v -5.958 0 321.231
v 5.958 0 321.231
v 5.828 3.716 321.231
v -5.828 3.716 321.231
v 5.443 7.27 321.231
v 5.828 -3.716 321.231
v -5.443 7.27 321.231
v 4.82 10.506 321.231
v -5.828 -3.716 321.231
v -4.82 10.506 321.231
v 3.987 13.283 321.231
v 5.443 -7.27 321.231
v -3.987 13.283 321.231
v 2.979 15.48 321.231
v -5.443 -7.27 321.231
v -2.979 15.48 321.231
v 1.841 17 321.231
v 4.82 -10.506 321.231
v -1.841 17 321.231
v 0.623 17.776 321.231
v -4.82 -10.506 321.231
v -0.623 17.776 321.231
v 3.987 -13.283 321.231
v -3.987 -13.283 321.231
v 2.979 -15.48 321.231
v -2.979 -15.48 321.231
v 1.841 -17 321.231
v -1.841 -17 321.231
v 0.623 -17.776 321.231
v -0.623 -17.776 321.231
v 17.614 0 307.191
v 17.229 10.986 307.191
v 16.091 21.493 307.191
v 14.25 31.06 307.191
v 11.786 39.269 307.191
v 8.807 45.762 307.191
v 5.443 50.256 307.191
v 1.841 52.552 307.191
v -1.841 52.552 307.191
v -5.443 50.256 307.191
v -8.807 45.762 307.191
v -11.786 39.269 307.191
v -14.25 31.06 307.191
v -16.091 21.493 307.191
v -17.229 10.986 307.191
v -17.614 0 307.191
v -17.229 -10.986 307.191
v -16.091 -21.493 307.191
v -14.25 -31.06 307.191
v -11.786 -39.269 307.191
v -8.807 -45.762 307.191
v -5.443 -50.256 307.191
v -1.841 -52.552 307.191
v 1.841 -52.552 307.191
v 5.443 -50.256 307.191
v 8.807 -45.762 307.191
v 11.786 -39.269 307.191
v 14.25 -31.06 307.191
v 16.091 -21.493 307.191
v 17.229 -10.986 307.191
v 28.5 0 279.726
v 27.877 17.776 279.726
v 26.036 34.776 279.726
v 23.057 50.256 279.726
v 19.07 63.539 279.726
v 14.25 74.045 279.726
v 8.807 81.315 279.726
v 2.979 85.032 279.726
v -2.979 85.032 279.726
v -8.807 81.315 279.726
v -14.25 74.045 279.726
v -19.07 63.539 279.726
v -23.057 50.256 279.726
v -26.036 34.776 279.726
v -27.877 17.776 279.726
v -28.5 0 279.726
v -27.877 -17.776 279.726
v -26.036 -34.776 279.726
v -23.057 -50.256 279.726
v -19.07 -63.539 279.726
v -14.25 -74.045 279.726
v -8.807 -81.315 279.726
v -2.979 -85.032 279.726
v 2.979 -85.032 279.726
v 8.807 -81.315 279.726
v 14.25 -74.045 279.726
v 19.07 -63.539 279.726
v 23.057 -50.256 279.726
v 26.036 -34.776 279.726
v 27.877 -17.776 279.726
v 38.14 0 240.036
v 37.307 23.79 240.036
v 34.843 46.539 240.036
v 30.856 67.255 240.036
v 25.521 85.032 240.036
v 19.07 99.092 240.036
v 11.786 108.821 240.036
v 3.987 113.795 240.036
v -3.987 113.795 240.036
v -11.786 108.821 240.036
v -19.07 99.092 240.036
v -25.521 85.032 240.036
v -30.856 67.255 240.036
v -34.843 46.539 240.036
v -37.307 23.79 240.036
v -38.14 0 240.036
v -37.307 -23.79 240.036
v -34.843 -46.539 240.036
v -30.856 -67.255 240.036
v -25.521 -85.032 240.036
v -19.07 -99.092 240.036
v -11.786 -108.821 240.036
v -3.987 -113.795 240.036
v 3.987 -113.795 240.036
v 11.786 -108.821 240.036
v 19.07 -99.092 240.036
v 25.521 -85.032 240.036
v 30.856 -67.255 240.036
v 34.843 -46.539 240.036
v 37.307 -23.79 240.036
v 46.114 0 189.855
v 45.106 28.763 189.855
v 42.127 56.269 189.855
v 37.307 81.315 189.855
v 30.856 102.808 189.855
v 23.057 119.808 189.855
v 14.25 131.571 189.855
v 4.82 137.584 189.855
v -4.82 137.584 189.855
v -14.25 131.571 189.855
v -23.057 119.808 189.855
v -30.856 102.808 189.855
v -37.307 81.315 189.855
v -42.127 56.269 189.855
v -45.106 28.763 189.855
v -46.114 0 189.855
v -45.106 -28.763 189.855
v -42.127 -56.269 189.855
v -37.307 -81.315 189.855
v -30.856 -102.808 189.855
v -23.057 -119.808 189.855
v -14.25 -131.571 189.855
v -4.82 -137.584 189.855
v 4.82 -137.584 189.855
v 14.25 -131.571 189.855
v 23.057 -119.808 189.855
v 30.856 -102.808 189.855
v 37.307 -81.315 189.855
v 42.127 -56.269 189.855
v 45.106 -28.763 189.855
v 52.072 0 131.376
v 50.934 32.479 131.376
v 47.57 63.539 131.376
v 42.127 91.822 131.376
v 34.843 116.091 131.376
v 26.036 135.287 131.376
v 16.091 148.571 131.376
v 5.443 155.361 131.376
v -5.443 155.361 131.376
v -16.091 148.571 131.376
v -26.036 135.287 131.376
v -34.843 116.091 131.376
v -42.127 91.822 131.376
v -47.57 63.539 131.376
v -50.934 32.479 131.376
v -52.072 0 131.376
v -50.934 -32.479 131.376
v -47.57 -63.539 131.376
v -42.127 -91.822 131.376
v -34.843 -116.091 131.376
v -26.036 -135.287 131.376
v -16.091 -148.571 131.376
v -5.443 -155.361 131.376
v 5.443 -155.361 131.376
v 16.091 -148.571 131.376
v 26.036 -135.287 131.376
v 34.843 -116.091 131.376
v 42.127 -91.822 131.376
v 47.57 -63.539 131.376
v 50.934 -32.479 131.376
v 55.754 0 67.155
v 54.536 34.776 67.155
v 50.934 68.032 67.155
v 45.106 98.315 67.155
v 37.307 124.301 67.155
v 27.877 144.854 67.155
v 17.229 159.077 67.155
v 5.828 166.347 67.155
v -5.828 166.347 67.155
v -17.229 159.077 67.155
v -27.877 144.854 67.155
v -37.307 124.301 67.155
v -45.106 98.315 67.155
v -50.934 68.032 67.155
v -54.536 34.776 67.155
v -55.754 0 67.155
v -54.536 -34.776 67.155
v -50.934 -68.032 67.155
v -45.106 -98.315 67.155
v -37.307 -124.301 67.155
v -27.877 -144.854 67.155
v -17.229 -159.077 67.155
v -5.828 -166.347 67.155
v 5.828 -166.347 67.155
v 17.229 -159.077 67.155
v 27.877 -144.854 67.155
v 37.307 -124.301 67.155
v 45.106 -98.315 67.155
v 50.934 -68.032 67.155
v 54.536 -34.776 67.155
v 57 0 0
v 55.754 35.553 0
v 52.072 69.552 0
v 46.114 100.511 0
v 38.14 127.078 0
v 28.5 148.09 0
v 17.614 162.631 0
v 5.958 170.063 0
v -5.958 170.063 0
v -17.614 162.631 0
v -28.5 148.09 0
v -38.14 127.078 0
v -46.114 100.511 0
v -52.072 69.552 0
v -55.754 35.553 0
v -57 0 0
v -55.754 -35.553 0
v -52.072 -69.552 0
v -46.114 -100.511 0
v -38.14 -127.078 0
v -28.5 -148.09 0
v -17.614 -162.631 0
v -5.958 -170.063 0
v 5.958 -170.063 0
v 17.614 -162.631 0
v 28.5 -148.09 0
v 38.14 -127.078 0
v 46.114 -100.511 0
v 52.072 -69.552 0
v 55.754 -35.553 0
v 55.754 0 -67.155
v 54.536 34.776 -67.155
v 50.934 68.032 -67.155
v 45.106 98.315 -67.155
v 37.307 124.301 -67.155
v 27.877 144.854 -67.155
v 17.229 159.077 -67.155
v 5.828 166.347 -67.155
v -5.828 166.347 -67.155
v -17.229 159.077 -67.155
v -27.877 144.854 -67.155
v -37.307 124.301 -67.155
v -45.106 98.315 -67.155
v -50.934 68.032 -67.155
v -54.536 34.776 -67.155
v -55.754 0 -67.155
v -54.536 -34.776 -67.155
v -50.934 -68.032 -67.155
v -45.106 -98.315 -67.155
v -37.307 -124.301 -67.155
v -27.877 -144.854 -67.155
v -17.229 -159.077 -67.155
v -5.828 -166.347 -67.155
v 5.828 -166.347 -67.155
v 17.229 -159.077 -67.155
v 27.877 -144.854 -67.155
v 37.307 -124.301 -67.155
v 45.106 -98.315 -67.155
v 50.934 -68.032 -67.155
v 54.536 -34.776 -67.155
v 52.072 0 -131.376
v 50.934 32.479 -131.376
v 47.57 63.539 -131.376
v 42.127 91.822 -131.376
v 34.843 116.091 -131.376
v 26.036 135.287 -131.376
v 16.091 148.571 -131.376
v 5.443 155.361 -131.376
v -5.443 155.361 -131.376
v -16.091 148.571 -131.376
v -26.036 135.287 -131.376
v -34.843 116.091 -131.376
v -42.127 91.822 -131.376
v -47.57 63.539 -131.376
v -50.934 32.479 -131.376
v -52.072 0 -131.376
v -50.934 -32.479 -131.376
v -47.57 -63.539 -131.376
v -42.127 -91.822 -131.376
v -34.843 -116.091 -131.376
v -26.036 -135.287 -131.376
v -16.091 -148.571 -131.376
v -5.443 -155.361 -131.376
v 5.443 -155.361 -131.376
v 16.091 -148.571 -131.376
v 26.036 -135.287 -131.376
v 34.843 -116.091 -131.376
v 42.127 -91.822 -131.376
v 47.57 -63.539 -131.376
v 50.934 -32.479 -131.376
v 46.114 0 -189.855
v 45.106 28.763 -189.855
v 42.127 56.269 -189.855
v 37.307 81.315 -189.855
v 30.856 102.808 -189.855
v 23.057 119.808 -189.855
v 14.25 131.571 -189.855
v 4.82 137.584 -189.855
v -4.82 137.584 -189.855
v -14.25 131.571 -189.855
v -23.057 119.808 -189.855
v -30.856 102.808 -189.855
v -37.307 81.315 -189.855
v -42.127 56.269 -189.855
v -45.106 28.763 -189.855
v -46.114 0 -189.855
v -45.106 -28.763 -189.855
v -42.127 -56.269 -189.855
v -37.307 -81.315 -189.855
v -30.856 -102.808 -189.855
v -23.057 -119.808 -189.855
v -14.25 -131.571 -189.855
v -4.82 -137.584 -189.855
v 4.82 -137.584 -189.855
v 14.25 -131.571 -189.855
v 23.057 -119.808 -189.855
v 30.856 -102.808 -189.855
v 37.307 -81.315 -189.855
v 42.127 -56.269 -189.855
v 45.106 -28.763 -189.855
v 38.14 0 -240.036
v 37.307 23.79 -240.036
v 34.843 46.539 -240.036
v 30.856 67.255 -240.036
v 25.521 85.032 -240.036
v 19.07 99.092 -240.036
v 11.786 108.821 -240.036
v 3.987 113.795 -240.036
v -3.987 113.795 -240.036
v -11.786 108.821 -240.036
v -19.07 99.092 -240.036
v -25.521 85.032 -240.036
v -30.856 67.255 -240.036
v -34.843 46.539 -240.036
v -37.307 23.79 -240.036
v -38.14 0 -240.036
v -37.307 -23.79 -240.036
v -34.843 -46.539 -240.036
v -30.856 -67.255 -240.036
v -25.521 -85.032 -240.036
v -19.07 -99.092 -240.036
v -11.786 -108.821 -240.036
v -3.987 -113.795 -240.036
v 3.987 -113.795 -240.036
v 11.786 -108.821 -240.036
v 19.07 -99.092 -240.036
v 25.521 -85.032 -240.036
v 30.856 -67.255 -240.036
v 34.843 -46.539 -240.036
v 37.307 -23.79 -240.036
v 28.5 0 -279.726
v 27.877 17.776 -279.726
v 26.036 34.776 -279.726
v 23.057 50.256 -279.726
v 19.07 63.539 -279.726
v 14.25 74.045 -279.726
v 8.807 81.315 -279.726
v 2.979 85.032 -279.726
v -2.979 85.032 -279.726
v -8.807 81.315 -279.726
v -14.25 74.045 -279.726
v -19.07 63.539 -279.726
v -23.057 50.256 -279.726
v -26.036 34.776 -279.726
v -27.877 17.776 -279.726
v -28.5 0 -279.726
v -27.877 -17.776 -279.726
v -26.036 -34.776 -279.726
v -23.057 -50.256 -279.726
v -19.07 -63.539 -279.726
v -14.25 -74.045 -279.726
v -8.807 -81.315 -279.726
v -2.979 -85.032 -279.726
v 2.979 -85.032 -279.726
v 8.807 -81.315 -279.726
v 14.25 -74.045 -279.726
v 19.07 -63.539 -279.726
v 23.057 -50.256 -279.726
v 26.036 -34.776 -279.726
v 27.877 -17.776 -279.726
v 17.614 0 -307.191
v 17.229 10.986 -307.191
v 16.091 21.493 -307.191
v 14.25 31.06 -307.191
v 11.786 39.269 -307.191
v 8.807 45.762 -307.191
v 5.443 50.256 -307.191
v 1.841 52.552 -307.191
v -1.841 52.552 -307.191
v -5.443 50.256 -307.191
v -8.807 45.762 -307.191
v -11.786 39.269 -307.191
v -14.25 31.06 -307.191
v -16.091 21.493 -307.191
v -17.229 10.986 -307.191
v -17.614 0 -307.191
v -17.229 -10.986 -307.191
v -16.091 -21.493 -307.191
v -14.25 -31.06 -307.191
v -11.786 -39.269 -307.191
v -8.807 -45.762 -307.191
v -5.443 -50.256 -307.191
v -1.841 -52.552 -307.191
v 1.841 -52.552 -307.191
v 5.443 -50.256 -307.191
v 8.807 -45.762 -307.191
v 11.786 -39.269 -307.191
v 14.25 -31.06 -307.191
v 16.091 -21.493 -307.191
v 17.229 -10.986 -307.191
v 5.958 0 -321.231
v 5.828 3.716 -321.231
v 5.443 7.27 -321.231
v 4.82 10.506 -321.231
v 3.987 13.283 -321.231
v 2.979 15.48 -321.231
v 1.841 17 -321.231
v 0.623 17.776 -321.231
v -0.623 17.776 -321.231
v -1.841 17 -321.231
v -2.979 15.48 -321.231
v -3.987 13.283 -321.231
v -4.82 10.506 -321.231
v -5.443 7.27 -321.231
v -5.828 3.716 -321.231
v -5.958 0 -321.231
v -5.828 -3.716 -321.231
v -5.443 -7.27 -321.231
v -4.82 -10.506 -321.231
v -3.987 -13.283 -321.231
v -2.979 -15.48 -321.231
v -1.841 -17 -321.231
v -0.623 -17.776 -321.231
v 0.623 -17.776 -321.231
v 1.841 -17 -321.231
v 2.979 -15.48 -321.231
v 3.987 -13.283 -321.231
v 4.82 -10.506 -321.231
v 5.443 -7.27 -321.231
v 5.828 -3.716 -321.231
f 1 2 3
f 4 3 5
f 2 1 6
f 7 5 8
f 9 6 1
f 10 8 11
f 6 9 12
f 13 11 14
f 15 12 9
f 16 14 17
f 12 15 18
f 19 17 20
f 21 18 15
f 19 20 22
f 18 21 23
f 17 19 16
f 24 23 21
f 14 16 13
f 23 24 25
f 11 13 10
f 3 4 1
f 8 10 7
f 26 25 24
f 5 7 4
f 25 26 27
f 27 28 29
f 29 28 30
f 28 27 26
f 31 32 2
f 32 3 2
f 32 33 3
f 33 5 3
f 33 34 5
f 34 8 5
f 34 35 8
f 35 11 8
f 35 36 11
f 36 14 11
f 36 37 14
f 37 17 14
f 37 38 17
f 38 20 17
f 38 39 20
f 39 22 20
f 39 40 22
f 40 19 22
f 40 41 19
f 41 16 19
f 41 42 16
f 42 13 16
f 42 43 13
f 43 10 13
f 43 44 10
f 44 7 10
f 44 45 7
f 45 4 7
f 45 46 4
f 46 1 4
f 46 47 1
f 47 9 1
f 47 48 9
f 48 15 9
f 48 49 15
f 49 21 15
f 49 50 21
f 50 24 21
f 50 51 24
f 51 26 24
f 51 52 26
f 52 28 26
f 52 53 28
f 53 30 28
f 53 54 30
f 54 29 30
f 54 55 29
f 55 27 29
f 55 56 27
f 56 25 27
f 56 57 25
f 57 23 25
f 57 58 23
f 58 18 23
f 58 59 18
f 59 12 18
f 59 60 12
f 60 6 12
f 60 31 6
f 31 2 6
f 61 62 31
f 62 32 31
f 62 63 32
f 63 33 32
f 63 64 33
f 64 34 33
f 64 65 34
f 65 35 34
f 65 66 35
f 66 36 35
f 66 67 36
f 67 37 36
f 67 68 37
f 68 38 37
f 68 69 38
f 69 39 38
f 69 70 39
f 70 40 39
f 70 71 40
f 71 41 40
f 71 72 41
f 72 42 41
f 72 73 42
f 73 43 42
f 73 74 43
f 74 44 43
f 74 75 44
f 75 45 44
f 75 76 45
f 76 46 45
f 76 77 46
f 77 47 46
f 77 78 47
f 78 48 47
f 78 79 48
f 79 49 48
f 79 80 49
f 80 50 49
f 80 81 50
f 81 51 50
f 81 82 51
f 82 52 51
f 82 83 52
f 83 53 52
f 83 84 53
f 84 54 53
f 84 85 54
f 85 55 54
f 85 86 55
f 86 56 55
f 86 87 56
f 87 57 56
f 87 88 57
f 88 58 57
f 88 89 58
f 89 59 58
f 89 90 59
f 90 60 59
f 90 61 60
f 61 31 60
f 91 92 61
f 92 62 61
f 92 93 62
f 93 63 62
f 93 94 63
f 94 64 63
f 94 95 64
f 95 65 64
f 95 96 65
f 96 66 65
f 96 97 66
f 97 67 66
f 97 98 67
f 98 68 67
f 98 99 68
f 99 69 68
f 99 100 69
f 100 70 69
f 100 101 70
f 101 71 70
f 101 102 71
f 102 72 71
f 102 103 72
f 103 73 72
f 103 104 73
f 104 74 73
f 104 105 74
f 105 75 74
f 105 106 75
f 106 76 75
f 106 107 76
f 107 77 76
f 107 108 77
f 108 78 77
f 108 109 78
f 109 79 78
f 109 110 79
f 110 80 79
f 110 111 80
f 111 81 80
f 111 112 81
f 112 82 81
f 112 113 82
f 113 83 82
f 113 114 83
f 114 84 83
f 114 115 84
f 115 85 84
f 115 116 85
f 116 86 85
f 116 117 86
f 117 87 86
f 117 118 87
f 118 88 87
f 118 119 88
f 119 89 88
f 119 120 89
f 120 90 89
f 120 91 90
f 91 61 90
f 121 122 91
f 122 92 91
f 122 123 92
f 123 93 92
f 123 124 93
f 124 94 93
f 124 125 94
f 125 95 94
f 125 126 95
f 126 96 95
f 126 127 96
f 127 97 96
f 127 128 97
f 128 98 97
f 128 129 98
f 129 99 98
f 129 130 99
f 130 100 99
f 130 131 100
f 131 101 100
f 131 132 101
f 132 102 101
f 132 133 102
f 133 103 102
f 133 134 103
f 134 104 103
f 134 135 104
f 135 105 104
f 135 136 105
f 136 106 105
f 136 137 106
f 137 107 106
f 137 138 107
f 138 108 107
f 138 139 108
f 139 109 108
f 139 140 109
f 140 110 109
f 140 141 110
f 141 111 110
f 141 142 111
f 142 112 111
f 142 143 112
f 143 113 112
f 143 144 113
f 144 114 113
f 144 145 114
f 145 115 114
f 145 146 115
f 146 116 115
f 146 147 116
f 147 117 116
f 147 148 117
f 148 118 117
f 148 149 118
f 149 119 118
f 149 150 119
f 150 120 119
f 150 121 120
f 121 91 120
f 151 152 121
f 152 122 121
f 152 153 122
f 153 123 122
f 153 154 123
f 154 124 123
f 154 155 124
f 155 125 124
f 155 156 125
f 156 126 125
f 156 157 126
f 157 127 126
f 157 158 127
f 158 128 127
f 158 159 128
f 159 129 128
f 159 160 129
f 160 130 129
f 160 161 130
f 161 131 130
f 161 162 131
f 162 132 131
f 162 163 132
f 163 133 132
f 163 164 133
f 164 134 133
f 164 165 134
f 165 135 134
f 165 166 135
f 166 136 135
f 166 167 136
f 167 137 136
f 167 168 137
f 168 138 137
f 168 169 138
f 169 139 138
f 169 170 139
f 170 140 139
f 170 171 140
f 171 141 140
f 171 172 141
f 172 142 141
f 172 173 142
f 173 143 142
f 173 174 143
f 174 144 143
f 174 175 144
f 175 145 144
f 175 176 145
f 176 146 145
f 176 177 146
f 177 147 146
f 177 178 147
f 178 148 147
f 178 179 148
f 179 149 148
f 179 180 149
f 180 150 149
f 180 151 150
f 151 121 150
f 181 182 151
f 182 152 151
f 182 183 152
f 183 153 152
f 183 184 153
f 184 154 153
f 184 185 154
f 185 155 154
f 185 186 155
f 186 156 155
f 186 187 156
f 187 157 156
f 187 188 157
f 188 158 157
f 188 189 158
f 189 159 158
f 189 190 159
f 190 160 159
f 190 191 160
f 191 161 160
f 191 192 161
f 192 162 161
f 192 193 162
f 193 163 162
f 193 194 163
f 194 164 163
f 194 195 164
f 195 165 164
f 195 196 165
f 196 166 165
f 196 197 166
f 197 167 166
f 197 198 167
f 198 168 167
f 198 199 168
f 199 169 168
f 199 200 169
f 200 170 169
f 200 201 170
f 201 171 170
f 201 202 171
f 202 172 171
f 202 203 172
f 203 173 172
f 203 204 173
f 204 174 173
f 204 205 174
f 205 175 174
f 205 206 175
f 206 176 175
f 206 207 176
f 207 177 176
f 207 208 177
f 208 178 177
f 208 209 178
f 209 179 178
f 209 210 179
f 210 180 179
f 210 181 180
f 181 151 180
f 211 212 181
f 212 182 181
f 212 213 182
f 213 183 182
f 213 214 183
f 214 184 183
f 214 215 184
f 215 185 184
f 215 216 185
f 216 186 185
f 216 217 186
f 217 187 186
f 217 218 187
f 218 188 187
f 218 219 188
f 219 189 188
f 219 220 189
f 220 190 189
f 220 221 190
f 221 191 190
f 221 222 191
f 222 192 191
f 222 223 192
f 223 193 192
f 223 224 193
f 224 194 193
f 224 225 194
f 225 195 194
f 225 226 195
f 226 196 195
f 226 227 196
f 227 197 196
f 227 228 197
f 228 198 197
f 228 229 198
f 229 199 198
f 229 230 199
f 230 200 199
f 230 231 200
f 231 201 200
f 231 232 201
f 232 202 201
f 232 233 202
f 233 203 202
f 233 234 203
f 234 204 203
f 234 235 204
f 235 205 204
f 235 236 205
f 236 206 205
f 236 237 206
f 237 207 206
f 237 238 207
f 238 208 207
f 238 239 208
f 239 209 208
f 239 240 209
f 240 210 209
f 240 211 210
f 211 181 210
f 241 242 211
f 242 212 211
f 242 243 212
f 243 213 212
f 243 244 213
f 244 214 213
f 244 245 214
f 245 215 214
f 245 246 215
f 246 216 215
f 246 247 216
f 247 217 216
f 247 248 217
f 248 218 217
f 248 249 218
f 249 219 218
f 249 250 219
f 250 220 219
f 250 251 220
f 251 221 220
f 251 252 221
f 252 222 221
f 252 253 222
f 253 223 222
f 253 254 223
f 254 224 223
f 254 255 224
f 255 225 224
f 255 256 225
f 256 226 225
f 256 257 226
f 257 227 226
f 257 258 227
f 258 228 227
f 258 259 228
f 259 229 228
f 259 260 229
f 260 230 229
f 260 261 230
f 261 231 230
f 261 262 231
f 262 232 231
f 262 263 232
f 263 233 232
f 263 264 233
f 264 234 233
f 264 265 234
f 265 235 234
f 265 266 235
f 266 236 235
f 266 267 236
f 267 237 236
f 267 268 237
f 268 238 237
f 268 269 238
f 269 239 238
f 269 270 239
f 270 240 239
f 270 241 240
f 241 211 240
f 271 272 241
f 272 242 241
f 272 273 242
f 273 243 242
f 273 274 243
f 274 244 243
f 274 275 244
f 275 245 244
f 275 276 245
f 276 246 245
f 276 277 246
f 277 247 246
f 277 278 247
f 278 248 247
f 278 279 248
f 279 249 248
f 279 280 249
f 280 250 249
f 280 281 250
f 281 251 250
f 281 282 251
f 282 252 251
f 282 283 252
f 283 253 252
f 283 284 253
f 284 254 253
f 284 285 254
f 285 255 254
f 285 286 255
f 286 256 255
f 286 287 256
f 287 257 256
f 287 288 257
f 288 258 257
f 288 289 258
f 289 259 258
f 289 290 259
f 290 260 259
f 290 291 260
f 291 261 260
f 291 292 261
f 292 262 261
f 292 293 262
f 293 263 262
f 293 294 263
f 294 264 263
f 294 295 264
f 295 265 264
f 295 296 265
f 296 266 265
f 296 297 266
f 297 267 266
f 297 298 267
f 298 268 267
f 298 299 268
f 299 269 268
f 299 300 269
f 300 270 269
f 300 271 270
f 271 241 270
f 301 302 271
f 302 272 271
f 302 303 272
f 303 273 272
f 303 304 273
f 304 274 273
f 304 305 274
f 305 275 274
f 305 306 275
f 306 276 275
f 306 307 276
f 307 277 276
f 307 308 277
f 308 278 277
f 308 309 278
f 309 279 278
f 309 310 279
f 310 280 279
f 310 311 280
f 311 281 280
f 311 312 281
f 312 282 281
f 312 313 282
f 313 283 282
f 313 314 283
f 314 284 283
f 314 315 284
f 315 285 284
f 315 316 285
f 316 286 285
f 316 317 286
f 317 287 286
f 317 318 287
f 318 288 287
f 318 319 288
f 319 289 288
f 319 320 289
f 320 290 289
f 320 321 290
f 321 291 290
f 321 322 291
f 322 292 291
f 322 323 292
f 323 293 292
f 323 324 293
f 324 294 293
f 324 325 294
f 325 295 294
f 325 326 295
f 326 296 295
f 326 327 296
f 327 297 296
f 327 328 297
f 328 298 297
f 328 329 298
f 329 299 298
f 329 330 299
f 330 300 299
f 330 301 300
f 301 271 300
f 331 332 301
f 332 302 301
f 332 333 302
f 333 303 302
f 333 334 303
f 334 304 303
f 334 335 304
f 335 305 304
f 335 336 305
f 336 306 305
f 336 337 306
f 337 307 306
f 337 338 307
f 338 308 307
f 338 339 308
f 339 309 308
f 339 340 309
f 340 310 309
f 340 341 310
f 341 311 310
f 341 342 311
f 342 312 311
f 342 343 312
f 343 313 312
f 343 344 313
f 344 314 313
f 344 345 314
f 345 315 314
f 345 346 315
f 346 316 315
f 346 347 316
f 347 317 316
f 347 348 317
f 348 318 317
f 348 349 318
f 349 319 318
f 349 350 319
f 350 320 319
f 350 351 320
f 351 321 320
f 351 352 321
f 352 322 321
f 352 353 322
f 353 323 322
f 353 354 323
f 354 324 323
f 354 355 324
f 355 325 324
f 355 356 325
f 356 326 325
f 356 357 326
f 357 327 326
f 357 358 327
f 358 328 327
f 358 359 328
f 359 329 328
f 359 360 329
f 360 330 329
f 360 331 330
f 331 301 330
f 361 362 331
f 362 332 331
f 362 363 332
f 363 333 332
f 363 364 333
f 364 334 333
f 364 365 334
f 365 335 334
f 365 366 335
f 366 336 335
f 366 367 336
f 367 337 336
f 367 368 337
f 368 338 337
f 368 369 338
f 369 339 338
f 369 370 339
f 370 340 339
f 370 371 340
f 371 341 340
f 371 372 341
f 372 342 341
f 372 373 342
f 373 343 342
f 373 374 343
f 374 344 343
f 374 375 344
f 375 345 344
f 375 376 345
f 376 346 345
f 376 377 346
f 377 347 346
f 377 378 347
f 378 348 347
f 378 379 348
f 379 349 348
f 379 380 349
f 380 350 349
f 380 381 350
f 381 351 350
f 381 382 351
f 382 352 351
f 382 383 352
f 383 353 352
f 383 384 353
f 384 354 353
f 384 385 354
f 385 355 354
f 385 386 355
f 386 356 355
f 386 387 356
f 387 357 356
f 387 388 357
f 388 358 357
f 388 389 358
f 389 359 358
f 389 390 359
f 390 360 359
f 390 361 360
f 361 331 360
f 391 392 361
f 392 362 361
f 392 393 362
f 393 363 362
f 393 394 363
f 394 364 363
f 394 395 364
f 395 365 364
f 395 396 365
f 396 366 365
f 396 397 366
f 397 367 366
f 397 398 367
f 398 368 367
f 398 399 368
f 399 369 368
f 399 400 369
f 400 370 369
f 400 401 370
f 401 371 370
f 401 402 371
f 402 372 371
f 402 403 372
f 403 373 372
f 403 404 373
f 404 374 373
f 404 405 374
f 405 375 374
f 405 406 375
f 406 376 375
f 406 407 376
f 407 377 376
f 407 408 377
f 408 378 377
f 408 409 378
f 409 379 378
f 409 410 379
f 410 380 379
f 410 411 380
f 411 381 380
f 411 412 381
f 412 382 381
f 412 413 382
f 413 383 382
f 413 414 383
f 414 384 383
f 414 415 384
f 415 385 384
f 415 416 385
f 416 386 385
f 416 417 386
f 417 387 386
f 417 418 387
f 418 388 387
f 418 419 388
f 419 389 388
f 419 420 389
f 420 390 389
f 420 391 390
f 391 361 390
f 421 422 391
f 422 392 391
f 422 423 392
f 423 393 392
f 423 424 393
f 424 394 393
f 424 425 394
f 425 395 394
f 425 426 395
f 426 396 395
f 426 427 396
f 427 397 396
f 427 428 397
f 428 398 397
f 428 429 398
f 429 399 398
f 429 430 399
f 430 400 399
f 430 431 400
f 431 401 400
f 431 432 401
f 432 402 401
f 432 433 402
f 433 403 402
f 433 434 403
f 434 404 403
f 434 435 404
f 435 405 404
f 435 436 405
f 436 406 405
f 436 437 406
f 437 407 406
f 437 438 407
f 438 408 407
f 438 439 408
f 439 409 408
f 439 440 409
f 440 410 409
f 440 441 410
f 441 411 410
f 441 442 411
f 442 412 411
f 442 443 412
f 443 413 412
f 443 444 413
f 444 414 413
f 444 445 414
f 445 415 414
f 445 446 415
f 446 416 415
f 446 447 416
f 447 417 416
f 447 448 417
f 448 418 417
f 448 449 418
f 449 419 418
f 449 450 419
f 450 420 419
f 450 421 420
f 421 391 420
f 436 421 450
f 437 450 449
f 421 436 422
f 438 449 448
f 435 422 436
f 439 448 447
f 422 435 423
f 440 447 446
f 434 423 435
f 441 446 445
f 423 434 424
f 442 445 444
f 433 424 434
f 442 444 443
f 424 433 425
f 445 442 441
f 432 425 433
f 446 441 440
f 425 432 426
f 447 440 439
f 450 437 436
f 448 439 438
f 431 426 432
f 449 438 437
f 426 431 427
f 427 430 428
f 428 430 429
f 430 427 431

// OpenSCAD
// Generated by SolidPython 1.0.1 on 2020-07-29 00:39:25


scale(v = [3, 9, 17]) {
	sphere(r = 19);
}
/***********************************************
*********      SolidPython code:      **********
************************************************
 
# import packages: SolidPython
from solid import *
from solid.utils import *
from itertools import chain, combinations


class Resize:

    def __init__(self, scad_file):
        self.scad_file = scad_file
        #self.scad_file = import_scad(scad_file)
        # cone/cylinder param:
        self.r1 = 0
        self.r2 = 0
        self.h = 0
        # rectangular prism param:
        self.w = 0
        self.l = 0
        # ellipse param:
        self.r = 0

    # import OpenScad code (file name corresponds to shape)


    # classify shape + parameters
    def assign(self, param1, param2, param3):
        if self.scad_file == 'cone.scad':
            self.r1 = param1
            self.r2 = param2
            self.h = param3
        elif self.scad_file == 'cylinder.scad':
            self.r1 = param1
            self.r2 = param2
            self.h = param3
        elif self.scad_file == 'rectangularPrism.scad':
            self.h = param1
            self.l = param2
            self.w = param3
        else:
            self.r = param1
            self.h = param2

    # resize parameters
    def iterate(self):
        x = range(3, 20, 2)
        i = 1
        if self.scad_file == 'cone.scad':
            tempList = list(combinations(x, 2))
            for temp in tempList:
                param1 = temp[0]
                param2 = temp[1]
                filepath = 'produced_scad_files/' + 'cone' + str(param1) + '_' + str(param2) + '_' + '.scad'
                scad_render_to_file(cylinder(h=param1, r1=param2, r2=0), filepath)

        elif self.scad_file == 'cylinder.scad':
            tempList = list(combinations(x, 3))
            for temp in tempList:
                param1 = temp[0]
                param2 = temp[1]
                filepath = 'produced_scad_files/' + 'cylinder' + str(param1) + '_' + str(param2) + '_' + '.scad'
                scad_render_to_file(cylinder(h=param1, r1=param2, r2=param2), filepath)

        elif self.scad_file == 'rectangularPrism.scad':
            tempList = list(combinations(x, 3))
            for temp in tempList:
                param1 = temp[0]
                param2 = temp[1]
                param3 = temp[2]
                filepath = 'produced_scad_files/' + 'rectangularPrism' + str(param1) + '_' + str(param2) + '_' + str(
                    param3) + '.scad'
                scad_render_to_file(cube(size=(param1, param2, param3)), filepath)

        elif self.scad_file == 'ellipse.scad':
            tempList = list(combinations(x, 4))
            for temp in tempList:
                param1 = temp[0]
                param2 = temp[1]
                param3 = temp[2]
                param4 = temp[3]
                filepath = 'produced_scad_files/' + 'ellipse' + str(param1) + '_' + str(param2) + '_' + str(param3) + '_' + str(param4) + '.scad'
                scad_render_to_file(scale([param1, param2, param3])(sphere(r=param4)), filepath)

    def render_to_scadfile(self):
        scad_render_to_file(scad, 'example.scad') 
 
************************************************/
